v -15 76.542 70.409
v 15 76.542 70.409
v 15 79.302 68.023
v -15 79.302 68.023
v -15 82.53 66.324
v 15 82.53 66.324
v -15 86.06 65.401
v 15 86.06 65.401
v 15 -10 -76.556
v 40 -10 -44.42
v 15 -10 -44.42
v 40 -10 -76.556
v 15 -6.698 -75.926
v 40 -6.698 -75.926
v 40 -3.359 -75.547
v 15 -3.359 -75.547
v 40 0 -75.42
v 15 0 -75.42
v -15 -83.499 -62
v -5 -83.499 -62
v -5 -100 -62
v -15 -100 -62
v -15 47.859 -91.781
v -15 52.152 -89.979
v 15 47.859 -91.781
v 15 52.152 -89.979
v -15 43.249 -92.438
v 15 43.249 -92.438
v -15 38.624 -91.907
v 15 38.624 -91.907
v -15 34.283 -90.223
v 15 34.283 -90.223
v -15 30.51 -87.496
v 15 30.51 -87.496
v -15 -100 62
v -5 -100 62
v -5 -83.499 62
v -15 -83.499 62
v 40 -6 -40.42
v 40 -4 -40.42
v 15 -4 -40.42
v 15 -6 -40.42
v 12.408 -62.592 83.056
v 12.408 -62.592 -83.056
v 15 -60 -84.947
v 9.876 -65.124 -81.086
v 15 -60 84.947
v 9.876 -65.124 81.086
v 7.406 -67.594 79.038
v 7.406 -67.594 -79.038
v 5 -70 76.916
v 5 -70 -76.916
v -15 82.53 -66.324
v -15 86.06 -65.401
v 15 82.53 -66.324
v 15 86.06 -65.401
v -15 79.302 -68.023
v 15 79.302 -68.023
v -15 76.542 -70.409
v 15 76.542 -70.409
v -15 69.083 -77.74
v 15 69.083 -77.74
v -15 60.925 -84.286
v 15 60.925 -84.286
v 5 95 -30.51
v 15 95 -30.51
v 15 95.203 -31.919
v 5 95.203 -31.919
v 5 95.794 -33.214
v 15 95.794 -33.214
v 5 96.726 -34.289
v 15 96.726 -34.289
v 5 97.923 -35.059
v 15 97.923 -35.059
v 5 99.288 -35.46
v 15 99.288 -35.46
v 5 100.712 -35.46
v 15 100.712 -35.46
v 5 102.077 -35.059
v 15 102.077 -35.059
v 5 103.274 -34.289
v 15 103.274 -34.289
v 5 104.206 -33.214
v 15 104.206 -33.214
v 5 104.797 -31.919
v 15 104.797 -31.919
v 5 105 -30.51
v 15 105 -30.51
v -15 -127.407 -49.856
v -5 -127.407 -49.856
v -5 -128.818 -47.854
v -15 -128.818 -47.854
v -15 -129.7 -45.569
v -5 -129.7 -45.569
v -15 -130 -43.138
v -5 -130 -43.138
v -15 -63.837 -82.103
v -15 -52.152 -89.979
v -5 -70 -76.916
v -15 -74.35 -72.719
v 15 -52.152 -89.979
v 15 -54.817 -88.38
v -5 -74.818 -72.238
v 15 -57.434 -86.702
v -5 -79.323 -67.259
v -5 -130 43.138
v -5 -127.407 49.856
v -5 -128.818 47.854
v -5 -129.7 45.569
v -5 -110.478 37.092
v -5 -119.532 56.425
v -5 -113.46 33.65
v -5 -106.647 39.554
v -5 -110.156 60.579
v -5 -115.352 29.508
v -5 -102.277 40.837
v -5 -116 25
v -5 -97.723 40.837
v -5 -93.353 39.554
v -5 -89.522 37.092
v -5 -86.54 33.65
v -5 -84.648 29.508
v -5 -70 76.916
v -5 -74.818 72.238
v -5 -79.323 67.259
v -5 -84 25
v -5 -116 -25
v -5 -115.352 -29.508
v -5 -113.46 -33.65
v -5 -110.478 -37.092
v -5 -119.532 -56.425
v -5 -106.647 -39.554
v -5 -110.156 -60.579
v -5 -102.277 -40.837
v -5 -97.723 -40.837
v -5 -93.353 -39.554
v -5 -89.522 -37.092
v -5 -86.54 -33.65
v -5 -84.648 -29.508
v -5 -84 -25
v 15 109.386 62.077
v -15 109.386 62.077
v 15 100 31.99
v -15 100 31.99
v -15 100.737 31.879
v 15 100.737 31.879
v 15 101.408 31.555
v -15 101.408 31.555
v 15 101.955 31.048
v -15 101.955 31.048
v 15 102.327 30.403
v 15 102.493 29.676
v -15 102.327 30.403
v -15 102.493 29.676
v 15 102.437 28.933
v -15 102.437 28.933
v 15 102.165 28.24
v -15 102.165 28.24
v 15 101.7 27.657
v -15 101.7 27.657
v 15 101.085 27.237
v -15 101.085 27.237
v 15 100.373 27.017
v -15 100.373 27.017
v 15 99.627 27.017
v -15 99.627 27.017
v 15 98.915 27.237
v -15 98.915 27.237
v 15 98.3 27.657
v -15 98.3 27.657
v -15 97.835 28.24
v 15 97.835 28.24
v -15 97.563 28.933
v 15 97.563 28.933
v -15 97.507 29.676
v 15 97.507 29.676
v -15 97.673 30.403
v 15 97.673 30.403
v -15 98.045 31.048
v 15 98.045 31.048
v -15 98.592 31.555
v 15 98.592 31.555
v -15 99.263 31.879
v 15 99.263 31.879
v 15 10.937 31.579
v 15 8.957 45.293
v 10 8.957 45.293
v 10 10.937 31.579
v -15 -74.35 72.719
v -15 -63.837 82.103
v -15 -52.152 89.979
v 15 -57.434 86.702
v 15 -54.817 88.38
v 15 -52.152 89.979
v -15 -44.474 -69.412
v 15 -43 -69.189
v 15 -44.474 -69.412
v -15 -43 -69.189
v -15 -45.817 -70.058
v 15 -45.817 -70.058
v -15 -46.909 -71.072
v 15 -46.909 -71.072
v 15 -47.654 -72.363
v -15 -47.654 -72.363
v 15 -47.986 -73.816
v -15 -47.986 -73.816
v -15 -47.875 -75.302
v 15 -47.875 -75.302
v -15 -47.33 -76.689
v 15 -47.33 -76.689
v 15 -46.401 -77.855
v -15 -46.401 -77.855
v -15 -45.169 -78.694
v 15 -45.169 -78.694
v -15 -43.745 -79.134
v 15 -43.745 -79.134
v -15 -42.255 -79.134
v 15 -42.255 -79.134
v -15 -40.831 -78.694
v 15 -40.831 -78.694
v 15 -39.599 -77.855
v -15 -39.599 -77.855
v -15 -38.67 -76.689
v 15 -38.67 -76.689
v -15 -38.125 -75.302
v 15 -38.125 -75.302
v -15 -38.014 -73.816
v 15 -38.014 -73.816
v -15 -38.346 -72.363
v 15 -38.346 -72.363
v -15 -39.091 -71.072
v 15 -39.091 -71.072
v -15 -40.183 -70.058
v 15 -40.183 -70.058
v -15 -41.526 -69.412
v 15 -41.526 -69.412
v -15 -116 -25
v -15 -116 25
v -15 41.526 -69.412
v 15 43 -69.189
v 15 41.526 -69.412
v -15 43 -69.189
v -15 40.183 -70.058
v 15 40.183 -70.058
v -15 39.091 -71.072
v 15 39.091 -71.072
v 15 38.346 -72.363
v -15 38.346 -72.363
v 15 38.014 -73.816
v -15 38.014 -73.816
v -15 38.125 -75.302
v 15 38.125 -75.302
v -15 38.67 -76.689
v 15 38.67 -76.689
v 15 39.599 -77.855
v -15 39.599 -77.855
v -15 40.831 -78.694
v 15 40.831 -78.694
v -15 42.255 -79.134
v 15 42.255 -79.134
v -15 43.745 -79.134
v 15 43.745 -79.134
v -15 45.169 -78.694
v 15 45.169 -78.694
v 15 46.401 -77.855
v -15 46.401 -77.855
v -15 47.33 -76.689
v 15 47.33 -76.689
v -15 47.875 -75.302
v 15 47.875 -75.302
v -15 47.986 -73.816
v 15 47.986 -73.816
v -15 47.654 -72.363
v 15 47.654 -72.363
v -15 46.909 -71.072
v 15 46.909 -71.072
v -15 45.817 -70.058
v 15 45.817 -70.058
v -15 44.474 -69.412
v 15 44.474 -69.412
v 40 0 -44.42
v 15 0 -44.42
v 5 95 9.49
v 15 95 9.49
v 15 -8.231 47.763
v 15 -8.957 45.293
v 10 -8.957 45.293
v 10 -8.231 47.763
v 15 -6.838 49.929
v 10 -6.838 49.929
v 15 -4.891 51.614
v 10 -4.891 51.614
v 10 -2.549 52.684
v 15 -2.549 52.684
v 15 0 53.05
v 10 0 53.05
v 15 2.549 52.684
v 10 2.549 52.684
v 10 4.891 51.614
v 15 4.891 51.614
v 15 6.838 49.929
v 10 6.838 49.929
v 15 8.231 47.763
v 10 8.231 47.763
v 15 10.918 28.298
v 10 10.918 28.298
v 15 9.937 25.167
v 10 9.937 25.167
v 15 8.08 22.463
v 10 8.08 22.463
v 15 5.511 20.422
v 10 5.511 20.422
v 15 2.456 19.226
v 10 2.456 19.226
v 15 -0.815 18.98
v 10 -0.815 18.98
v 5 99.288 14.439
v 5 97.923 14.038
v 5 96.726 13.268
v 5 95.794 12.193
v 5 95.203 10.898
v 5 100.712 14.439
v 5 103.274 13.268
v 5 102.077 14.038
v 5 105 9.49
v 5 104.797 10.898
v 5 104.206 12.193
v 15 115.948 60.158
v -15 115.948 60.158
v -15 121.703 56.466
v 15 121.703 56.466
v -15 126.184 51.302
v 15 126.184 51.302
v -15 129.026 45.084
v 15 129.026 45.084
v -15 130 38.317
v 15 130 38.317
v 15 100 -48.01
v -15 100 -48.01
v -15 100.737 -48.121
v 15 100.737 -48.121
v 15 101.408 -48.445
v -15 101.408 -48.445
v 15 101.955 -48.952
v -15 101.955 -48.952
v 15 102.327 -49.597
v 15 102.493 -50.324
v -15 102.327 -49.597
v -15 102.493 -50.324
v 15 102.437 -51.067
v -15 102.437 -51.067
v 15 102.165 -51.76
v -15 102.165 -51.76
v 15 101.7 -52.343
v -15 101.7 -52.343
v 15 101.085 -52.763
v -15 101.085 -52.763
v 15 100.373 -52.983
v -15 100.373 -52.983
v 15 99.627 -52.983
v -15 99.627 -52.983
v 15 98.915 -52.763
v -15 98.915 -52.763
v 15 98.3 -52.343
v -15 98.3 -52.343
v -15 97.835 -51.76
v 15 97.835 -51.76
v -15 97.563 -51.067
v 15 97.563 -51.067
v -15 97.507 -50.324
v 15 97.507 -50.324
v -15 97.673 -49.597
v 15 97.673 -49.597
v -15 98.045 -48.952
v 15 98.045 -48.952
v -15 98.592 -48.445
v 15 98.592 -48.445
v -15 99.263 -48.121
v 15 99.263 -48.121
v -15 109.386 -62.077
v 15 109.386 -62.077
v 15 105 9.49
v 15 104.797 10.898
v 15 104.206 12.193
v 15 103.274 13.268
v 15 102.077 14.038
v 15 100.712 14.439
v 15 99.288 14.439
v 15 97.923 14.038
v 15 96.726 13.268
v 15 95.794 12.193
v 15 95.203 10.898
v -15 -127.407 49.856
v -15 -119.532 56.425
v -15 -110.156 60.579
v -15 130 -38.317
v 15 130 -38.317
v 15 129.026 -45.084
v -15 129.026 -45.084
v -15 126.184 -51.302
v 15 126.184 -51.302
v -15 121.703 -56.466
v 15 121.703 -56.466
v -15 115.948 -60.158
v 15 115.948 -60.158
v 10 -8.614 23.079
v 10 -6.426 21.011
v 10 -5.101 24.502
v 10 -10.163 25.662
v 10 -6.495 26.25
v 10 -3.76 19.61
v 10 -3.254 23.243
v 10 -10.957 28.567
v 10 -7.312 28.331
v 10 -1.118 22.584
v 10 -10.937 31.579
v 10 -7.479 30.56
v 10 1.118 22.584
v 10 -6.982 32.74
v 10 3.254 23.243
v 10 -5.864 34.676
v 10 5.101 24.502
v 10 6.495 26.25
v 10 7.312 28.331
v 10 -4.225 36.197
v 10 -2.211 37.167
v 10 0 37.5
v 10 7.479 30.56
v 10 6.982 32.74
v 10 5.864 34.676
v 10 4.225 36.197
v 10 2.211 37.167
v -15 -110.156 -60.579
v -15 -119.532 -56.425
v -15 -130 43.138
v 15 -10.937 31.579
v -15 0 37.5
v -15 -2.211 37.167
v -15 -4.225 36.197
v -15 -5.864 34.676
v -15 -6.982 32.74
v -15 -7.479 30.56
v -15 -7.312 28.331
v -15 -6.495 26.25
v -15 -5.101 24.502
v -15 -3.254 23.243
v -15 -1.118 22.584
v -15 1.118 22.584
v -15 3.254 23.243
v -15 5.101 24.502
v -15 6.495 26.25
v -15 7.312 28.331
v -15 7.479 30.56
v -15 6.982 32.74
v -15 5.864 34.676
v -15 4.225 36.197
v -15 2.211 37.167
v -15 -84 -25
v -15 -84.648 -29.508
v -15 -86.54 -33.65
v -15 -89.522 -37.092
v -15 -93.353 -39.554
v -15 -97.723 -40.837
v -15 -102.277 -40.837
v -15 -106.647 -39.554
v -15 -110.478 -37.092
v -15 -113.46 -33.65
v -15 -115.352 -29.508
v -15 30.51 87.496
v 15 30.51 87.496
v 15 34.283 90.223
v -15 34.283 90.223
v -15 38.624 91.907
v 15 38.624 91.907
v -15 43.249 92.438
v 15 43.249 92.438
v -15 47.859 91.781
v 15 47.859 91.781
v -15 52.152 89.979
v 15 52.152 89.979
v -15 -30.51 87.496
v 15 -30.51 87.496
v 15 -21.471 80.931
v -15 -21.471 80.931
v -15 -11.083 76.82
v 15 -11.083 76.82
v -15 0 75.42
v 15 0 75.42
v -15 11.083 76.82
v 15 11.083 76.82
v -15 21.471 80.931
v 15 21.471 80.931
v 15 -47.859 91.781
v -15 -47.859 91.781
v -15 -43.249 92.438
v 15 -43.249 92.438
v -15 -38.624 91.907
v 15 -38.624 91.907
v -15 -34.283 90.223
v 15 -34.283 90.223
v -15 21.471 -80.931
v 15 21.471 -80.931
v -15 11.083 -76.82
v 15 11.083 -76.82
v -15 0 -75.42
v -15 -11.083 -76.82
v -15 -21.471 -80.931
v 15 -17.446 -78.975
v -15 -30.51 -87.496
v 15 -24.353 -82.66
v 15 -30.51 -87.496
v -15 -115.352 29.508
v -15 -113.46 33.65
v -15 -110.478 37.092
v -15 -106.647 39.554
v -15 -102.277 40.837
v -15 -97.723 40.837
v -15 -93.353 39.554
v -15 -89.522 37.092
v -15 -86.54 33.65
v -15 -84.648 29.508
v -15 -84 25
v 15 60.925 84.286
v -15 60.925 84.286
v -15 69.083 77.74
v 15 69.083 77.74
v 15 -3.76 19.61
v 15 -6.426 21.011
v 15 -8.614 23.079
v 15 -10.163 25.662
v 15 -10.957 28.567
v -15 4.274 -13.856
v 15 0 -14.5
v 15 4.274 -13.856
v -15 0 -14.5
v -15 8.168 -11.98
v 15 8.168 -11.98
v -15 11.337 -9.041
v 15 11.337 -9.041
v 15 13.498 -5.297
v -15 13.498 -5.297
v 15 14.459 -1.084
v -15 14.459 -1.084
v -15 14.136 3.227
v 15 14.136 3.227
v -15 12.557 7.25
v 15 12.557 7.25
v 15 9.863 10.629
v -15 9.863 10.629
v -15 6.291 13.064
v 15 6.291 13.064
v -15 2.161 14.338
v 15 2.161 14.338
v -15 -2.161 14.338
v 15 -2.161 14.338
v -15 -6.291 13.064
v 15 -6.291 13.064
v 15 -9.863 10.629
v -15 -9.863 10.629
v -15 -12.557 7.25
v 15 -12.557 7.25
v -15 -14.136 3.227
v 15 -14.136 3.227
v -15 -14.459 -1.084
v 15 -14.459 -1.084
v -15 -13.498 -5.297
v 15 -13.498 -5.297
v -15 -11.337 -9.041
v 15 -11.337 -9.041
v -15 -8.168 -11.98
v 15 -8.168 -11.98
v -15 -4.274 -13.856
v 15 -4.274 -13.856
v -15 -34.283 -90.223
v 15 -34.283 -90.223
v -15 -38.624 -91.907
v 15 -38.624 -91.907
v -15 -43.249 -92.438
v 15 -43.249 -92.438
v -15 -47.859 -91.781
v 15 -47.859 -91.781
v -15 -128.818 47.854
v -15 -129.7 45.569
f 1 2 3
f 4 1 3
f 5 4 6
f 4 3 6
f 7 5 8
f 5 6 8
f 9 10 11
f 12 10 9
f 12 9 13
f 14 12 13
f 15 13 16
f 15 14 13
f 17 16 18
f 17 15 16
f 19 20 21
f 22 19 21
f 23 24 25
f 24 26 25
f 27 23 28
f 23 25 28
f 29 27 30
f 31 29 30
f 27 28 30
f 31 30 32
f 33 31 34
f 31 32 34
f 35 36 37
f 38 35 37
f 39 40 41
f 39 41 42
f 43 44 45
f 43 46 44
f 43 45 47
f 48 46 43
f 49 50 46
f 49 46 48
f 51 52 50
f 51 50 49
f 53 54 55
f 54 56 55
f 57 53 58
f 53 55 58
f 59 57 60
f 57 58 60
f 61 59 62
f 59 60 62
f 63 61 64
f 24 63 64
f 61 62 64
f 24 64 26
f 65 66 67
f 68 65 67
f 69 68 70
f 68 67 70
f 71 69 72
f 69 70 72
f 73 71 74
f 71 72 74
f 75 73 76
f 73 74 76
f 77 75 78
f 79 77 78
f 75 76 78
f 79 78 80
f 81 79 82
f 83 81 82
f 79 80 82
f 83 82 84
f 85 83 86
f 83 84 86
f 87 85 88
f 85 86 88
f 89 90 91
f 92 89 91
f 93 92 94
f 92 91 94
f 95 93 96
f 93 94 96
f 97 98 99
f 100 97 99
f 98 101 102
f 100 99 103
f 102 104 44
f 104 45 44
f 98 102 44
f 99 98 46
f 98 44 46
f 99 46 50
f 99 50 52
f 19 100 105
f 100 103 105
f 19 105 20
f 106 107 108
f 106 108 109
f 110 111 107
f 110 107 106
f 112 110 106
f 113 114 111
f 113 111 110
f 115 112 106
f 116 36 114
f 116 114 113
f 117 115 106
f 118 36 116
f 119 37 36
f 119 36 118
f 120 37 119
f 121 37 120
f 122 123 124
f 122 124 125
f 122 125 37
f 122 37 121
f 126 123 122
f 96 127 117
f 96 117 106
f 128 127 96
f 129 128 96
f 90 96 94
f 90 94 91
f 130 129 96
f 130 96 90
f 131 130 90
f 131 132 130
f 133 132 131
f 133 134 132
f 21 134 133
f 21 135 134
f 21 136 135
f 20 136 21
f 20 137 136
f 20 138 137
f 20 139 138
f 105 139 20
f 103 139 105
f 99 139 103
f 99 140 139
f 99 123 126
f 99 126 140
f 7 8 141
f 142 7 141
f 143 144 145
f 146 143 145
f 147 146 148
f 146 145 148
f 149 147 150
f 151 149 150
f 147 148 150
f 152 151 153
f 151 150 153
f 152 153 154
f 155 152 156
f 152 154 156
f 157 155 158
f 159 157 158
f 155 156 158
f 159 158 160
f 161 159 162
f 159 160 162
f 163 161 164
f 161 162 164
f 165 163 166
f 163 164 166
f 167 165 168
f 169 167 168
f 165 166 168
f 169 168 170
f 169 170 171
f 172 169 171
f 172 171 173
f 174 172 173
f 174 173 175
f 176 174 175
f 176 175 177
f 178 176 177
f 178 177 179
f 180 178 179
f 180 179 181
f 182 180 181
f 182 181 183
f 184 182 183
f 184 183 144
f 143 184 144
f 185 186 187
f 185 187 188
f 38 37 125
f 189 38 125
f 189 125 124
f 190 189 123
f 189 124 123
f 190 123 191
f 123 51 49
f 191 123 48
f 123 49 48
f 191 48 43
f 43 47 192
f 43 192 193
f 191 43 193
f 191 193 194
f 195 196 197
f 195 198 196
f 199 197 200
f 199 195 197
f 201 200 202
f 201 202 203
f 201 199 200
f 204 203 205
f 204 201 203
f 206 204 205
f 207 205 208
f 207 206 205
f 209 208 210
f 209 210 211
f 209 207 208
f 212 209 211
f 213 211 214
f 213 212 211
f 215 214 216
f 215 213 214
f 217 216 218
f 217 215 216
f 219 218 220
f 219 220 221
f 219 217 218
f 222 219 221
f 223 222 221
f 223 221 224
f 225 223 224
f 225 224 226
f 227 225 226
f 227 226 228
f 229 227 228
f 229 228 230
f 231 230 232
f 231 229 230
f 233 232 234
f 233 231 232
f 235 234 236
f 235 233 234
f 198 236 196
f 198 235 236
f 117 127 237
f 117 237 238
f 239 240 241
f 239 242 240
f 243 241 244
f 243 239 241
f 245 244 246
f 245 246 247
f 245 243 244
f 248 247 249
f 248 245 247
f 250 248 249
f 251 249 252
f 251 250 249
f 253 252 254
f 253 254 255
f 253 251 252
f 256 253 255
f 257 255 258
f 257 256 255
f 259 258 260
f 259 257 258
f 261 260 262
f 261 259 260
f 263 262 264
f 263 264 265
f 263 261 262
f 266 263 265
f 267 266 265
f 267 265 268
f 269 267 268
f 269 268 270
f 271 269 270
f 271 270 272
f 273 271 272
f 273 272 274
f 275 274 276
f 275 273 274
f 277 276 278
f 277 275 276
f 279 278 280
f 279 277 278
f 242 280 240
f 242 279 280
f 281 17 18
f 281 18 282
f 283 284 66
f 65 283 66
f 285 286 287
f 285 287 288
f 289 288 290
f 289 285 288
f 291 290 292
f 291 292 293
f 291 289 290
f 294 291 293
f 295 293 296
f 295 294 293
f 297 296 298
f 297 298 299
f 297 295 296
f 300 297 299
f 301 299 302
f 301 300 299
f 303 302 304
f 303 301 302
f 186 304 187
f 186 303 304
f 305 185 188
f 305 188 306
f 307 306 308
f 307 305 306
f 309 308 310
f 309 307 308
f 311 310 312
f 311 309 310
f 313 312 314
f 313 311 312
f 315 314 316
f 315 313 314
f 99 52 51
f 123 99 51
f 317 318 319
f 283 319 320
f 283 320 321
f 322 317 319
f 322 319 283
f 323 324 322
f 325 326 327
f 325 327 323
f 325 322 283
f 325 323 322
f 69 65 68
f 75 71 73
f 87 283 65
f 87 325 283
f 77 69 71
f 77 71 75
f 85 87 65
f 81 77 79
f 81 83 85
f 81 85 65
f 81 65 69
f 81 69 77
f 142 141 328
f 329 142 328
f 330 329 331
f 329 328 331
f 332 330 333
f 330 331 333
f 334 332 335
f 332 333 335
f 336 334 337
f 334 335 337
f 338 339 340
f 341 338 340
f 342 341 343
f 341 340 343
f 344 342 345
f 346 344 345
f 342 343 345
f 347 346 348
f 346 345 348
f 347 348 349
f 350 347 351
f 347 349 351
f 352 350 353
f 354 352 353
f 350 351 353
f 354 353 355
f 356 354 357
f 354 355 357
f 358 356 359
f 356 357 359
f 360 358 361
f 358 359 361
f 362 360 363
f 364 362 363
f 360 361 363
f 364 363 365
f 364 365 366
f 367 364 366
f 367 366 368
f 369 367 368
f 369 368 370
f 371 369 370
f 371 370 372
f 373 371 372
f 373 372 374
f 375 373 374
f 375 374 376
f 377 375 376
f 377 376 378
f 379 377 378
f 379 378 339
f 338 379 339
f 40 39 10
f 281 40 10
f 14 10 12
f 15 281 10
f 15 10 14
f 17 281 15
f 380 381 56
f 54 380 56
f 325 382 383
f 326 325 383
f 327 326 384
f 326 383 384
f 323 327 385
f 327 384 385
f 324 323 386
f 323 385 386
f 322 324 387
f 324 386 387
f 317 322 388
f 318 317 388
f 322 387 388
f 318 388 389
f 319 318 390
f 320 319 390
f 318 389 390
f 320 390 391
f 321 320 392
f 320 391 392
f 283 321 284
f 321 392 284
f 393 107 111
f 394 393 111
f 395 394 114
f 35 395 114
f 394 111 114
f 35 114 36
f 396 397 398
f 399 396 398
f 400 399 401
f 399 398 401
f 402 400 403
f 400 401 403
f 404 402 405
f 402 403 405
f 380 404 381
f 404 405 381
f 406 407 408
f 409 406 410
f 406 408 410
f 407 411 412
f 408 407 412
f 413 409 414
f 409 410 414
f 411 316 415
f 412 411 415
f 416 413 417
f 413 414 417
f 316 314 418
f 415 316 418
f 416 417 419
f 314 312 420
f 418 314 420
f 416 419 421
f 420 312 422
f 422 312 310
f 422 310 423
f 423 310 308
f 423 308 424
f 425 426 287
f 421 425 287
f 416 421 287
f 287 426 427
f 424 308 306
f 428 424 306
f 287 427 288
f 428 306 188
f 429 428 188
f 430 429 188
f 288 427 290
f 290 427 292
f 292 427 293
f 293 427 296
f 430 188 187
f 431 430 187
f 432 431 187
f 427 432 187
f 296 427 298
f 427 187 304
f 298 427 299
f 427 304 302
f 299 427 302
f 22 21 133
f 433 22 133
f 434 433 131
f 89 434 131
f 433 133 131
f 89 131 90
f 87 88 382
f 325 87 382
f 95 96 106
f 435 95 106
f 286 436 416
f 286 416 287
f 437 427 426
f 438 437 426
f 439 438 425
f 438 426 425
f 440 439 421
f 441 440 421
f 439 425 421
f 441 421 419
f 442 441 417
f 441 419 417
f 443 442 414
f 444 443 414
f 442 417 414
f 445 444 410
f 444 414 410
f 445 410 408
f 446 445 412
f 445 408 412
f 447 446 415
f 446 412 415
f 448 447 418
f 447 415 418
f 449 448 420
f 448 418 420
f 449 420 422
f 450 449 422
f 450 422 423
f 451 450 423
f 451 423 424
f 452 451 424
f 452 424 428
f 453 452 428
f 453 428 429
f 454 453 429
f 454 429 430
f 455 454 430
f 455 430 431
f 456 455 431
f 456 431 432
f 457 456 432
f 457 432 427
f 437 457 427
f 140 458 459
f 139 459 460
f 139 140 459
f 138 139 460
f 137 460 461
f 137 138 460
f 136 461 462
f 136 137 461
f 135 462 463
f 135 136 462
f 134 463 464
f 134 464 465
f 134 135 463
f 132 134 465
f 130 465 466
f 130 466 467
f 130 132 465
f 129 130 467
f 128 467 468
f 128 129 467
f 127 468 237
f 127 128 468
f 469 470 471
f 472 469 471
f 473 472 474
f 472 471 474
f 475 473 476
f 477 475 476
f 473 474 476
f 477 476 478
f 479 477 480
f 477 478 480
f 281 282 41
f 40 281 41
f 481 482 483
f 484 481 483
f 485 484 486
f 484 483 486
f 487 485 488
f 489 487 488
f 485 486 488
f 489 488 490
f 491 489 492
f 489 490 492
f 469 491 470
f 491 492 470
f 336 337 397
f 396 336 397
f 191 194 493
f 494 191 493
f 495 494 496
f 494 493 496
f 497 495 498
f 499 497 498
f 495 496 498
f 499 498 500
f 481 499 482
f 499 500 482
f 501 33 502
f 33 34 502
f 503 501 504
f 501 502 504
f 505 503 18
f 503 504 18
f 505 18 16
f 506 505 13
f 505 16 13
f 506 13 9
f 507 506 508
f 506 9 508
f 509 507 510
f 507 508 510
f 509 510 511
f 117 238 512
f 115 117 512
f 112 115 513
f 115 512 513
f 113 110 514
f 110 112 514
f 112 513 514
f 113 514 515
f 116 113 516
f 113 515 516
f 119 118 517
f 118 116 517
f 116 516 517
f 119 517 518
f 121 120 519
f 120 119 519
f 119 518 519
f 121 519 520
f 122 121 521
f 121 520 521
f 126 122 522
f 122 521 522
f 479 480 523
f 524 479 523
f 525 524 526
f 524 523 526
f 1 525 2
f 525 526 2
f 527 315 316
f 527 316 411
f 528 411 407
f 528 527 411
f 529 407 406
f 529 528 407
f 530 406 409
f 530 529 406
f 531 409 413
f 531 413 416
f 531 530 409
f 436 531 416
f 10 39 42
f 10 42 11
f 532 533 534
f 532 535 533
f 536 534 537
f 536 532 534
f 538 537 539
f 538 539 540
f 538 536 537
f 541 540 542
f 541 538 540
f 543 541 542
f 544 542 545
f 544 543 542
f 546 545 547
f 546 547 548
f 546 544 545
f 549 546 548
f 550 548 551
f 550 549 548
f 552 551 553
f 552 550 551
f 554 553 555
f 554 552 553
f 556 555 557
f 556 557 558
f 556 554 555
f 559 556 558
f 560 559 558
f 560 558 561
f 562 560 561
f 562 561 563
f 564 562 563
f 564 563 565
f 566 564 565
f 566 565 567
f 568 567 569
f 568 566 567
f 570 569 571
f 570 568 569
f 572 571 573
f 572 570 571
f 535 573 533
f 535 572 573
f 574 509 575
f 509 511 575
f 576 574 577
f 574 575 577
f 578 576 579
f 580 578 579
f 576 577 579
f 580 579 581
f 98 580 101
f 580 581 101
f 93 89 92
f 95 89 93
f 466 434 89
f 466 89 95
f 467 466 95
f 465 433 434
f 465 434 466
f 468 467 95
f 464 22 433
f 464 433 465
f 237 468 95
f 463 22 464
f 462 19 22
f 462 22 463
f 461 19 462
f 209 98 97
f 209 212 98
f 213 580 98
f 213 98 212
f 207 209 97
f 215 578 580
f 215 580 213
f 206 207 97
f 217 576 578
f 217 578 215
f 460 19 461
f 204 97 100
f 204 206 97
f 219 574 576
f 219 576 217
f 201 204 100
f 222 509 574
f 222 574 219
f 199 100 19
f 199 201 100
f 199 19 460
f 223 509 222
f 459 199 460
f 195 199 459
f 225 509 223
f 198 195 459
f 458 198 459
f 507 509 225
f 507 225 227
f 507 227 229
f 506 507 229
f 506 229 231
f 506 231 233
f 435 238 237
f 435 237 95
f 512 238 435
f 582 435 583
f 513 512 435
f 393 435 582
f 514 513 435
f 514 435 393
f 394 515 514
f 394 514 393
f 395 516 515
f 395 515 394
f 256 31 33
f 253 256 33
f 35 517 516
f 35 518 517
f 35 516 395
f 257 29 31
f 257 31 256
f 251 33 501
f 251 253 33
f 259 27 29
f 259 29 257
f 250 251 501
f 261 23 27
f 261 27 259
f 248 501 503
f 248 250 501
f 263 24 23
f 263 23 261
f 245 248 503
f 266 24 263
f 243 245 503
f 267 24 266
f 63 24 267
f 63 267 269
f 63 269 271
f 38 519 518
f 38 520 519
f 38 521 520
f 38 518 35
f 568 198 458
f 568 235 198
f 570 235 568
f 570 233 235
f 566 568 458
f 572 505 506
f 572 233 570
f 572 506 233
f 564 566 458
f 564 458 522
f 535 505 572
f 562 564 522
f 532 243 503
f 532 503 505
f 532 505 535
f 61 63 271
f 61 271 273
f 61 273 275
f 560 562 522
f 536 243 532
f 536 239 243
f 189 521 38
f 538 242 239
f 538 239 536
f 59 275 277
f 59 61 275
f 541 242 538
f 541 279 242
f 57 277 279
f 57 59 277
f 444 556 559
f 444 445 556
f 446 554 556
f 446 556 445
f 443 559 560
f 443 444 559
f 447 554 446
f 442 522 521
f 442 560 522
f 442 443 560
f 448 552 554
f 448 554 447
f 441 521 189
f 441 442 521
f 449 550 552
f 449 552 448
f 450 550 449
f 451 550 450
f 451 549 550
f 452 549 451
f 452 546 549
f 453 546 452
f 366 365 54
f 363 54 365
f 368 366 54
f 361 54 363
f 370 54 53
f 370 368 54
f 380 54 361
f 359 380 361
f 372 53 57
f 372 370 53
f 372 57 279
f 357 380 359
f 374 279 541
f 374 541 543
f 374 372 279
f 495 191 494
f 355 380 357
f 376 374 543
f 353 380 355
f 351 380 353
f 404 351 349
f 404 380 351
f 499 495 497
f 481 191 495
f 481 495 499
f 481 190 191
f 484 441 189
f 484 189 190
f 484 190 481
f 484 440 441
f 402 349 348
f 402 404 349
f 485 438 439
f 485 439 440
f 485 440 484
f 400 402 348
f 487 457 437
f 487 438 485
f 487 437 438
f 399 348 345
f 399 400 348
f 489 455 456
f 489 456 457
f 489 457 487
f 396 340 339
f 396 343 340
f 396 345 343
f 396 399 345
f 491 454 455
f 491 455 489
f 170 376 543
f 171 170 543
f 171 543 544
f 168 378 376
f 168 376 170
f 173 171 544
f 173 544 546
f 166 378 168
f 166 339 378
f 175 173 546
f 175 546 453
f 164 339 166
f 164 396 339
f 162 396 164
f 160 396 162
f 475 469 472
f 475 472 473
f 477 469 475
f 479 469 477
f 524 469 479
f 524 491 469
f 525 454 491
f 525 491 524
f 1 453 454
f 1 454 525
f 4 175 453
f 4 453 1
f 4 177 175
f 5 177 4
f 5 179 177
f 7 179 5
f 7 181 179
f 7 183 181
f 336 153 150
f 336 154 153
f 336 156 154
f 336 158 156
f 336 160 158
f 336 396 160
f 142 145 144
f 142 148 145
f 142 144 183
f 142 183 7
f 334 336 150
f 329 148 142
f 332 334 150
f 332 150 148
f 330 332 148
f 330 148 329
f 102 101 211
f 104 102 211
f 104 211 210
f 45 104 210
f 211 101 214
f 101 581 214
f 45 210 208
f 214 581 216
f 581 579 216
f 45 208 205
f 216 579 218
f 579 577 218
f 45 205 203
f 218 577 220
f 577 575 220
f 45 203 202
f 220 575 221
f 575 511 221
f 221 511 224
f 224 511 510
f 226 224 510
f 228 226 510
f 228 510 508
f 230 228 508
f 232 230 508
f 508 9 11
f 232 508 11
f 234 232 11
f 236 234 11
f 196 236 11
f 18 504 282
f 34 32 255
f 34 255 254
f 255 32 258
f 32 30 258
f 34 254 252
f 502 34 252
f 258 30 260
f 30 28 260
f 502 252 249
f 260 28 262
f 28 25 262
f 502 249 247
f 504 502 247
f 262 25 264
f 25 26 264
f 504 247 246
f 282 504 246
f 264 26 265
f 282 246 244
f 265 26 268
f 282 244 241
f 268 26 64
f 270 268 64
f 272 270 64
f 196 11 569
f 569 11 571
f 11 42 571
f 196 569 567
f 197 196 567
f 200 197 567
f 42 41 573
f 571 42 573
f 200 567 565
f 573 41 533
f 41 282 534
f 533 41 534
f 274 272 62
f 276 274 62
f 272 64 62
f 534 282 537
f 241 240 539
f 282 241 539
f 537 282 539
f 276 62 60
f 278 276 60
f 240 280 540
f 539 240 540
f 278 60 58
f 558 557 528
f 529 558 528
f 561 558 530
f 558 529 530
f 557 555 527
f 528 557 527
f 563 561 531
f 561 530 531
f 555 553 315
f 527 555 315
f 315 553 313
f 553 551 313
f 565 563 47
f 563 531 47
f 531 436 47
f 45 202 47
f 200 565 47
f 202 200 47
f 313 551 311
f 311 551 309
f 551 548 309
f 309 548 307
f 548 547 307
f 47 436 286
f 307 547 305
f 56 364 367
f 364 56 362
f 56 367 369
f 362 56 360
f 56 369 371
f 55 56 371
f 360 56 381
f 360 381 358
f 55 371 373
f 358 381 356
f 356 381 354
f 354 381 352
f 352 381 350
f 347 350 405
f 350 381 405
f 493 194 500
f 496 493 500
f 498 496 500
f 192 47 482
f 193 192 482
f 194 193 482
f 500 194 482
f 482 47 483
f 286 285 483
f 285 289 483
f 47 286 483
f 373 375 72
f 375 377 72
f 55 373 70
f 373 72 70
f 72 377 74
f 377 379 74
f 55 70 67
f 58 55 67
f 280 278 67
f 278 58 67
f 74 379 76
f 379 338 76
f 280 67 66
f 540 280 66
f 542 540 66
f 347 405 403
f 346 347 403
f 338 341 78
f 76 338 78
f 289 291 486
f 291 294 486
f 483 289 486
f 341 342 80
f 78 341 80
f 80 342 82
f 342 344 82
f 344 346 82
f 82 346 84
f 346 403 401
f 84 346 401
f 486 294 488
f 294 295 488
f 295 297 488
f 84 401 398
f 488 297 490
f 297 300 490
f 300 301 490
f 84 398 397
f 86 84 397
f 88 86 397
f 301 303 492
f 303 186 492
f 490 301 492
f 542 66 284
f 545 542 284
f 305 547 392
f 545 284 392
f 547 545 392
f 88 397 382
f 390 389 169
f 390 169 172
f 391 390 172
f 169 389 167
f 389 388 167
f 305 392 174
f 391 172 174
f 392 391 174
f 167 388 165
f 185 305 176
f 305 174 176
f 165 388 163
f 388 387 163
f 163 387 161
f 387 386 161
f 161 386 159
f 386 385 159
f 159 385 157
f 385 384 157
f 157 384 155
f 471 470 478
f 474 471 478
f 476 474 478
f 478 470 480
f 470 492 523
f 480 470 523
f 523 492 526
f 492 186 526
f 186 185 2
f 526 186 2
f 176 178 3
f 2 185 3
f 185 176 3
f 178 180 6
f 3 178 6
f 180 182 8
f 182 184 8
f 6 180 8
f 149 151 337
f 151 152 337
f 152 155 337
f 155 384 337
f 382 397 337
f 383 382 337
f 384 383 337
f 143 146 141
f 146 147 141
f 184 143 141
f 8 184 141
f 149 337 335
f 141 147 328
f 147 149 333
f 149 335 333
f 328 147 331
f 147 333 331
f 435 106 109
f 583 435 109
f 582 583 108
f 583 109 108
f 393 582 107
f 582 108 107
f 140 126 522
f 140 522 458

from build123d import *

# Parameters (mm, degrees)
SZKIC1_R                    = 14.5
SZKIC1_R_2                  = 5
DODANIE_WYCI_GNI_CIE1_DEPTH = 15
M6_TAPPED_HOLE1_D           = 5
DODANIE_WYCI_GNI_CIE3_START = -25
DODANIE_WYCI_GNI_CIE3_DEPTH = 25
WYTNIJ_WYCI_GNI_CIE2_DEPTH  = 10
WYTNIJ_WYCI_GNI_CIE4_DEPTH  = 20
SFAZOWANIE4_SIZE            = 10
WYTNIJ_WYCI_GNI_CIE5_DEPTH  = 5
SZKIC17_5_R                 = 7.5
WYTNIJ_WYCI_GNI_CIE6_DEPTH  = 163.311542951


with BuildPart() as part:
    # Szkic1 → Dodanie-wyciągnięcie1 (new, symmetric)
    with BuildSketch(Plane(origin=(0, 0, 0), x_dir=(0, 0, -1), z_dir=(1, 0, 0))):
        with BuildLine():
            Line((62.076569761, 109.385977671), (65.40069858, 86.060032436))
            ThreePointArc((65.40069858, 86.060032436), (67.080888035, 80.867469231), (70.408575711, 76.541704099))
            ThreePointArc((70.408575711, 76.541704099), (81.115709466, 65.086416999), (89.978943384, 52.151603499))
            ThreePointArc((89.978943384, 52.151603499), (92.32041193, 40.919666146), (87.495806927, 30.50995538))
            ThreePointArc((87.495806927, 30.50995538), (75.419960244, 0), (87.495806927, -30.50995538))
            ThreePointArc((87.495806927, -30.50995538), (92.32041193, -40.919666146), (89.978943384, -52.151603499))
            ThreePointArc((89.978943384, -52.151603499), (77.589025222, -69.25274843), (62, -83.498502981))
            Line((62, -83.498502981), (62, -100))
            ThreePointArc((62, -100), (58.828108774, -114.988630917), (49.856267202, -127.407407407))
            ThreePointArc((49.856267202, -127.407407407), (46.738768646, -129.329364235), (43.138357147, -130))
            Line((43.138357147, -130), (25, -130))
            Line((25, -130), (-25, -130))
            Line((-25, -130), (-43.138357147, -130))
            ThreePointArc((-43.138357147, -130), (-46.738768646, -129.329364235), (-49.856267202, -127.407407407))
            ThreePointArc((-49.856267202, -127.407407407), (-58.828108774, -114.988630917), (-62, -100))
            Line((-62, -100), (-62, -83.498502981))
            ThreePointArc((-62, -83.498502981), (-77.589025222, -69.25274843), (-89.978943384, -52.151603499))
            ThreePointArc((-89.978943384, -52.151603499), (-92.32041193, -40.919666146), (-87.495806927, -30.50995538))
            ThreePointArc((-87.495806927, -30.50995538), (-75.419960244, 0), (-87.495806927, 30.50995538))
            ThreePointArc((-87.495806927, 30.50995538), (-92.32041193, 40.919666146), (-89.978943384, 52.151603499))
            ThreePointArc((-89.978943384, 52.151603499), (-81.115709466, 65.086416999), (-70.408575711, 76.541704099))
            ThreePointArc((-70.408575711, 76.541704099), (-67.080888035, 80.867469231), (-65.40069858, 86.060032436))
            Line((-65.40069858, 86.060032436), (-62.076569761, 109.385977671))
            ThreePointArc((-62.076569761, 109.385977671), (-54.044566654, 124.12820267), (-38.316621209, 130))
            Line((-38.316621209, 130), (38.316621209, 130))
            ThreePointArc((38.316621209, 130), (54.044566654, 124.12820267), (62.076569761, 109.385977671))
        make_face()
        Circle(SZKIC1_R, mode=Mode.SUBTRACT)
        with Locations((74.189369185, -43)):
            Circle(SZKIC1_R_2, mode=Mode.SUBTRACT)
        with Locations((74.189369185, 43)):
            Circle(SZKIC1_R_2, mode=Mode.SUBTRACT)
        with BuildLine():
            Line((-25, -84), (25, -84))
            ThreePointArc((25, -84), (41, -100), (25, -116))
            Line((25, -116), (-25, -116))
            ThreePointArc((-25, -116), (-41, -100), (-25, -84))
        make_face(mode=Mode.SUBTRACT)
    extrude(amount=DODANIE_WYCI_GNI_CIE1_DEPTH, both=True)

    # M6 Tapped Hole1 (through all)
    with Locations(Plane(origin=(15, 0, 0), x_dir=(0, 0, -1), z_dir=(1, 0, 0))):
        with Locations((-29.489576473, 100), (50.510423527, 100)):
            Hole(M6_TAPPED_HOLE1_D / 2)

    # Szkic5 → Dodanie-wyciągnięcie3 (add)
    with BuildSketch(Plane.ZY.offset(-15).offset(DODANIE_WYCI_GNI_CIE3_START)):
        with BuildLine():
            Line((-40.419960244, -6), (-44.419960244, -10))
            Line((-44.419960244, -10), (-76.556013712, -10))
            ThreePointArc((-76.556013712, -10), (-75.704884126, -5.032161998), (-75.419960244, 0))
            Line((-75.419960244, 0), (-44.419960244, 0))
            Line((-44.419960244, 0), (-40.419960244, -4))
            Line((-40.419960244, -4), (-40.419960244, -6))
        make_face()
    extrude(amount=DODANIE_WYCI_GNI_CIE3_DEPTH)

    # Szkic12 → Wytnij-wyciągnięcie2 (cut)
    with BuildSketch(Plane(origin=(15, 0, 0), x_dir=(0, 0, -1), z_dir=(1, 0, 0))):
        with BuildLine():
            Line((30.510423527, 105), (-9.489576473, 105))
            ThreePointArc((-9.489576473, 105), (-14.489576473, 100), (-9.489576473, 95))
            Line((-9.489576473, 95), (30.510423527, 95))
            ThreePointArc((30.510423527, 95), (35.510423527, 100), (30.510423527, 105))
        make_face()
    extrude(amount=-WYTNIJ_WYCI_GNI_CIE2_DEPTH, mode=Mode.SUBTRACT)

    # Szkic16 → Wytnij-wyciągnięcie4 (cut)
    with BuildSketch(Plane(origin=(15, 0, 0), x_dir=(0, 0, -1), z_dir=(1, 0, 0))):
        with BuildLine():
            Line((-43.138357147, -130), (43.138357147, -130))
            ThreePointArc((43.138357147, -130), (46.738768646, -129.329364235), (49.856267202, -127.407407407))
            ThreePointArc((49.856267202, -127.407407407), (58.828108774, -114.988630917), (62, -100))
            Line((62, -100), (62, -83.498502981))
            ThreePointArc((62, -83.498502981), (69.784912958, -77.110738056), (76.915538092, -70))
            Line((76.915538092, -70), (-76.915538092, -70))
            ThreePointArc((-76.915538092, -70), (-69.784912958, -77.110738056), (-62, -83.498502981))
            Line((-62, -83.498502981), (-62, -100))
            ThreePointArc((-62, -100), (-58.828108774, -114.988630917), (-49.856267202, -127.407407407))
            ThreePointArc((-49.856267202, -127.407407407), (-46.738768646, -129.329364235), (-43.138357147, -130))
        make_face()
        with BuildLine():
            Line((-25, -116), (25, -116))
            ThreePointArc((25, -116), (41, -100), (25, -84))
            Line((25, -84), (-25, -84))
            ThreePointArc((-25, -84), (-41, -100), (-25, -116))
        make_face(mode=Mode.SUBTRACT)
    extrude(amount=-WYTNIJ_WYCI_GNI_CIE4_DEPTH, mode=Mode.SUBTRACT)

    # Sfazowanie4
    sfazowanie4_edges = [part.edges().sort_by_distance(p)[0] for p in [
        (15, -70, 0),
    ]]
    chamfer(sfazowanie4_edges, length=SFAZOWANIE4_SIZE)

    # Szkic17 → Wytnij-wyciągnięcie5 (cut)
    with BuildSketch(Plane(origin=(15, 0, 0), x_dir=(0, 0, -1), z_dir=(1, 0, 0))):
        with BuildLine():
            Line((-31.578571429, -10.936663672), (-45.292857143, -8.957177035))
            ThreePointArc((-45.292857143, -8.957177035), (-53.050000001, 0), (-45.292857143, 8.957177034))
            Line((-45.292857143, 8.957177034), (-31.578571428, 10.93666367))
            ThreePointArc((-31.578571428, 10.93666367), (-22.462605729, 8.080234378), (-18.98012619, -0.815402484))
            ThreePointArc((-18.98012619, -0.815402484), (-23.079412621, -8.614404817), (-31.578571429, -10.936663672))
        make_face()
    extrude(amount=-WYTNIJ_WYCI_GNI_CIE5_DEPTH, mode=Mode.SUBTRACT)

    # Szkic17<5> → Wytnij-wyciągnięcie6 (cut, through all)
    with BuildSketch(Plane(origin=(15, 0, 0), x_dir=(0, 0, -1), z_dir=(1, 0, 0))):
        with Locations((-30, -1e-09)):
            Circle(SZKIC17_5_R)
    extrude(amount=-WYTNIJ_WYCI_GNI_CIE6_DEPTH, mode=Mode.SUBTRACT)


solid = part.part
